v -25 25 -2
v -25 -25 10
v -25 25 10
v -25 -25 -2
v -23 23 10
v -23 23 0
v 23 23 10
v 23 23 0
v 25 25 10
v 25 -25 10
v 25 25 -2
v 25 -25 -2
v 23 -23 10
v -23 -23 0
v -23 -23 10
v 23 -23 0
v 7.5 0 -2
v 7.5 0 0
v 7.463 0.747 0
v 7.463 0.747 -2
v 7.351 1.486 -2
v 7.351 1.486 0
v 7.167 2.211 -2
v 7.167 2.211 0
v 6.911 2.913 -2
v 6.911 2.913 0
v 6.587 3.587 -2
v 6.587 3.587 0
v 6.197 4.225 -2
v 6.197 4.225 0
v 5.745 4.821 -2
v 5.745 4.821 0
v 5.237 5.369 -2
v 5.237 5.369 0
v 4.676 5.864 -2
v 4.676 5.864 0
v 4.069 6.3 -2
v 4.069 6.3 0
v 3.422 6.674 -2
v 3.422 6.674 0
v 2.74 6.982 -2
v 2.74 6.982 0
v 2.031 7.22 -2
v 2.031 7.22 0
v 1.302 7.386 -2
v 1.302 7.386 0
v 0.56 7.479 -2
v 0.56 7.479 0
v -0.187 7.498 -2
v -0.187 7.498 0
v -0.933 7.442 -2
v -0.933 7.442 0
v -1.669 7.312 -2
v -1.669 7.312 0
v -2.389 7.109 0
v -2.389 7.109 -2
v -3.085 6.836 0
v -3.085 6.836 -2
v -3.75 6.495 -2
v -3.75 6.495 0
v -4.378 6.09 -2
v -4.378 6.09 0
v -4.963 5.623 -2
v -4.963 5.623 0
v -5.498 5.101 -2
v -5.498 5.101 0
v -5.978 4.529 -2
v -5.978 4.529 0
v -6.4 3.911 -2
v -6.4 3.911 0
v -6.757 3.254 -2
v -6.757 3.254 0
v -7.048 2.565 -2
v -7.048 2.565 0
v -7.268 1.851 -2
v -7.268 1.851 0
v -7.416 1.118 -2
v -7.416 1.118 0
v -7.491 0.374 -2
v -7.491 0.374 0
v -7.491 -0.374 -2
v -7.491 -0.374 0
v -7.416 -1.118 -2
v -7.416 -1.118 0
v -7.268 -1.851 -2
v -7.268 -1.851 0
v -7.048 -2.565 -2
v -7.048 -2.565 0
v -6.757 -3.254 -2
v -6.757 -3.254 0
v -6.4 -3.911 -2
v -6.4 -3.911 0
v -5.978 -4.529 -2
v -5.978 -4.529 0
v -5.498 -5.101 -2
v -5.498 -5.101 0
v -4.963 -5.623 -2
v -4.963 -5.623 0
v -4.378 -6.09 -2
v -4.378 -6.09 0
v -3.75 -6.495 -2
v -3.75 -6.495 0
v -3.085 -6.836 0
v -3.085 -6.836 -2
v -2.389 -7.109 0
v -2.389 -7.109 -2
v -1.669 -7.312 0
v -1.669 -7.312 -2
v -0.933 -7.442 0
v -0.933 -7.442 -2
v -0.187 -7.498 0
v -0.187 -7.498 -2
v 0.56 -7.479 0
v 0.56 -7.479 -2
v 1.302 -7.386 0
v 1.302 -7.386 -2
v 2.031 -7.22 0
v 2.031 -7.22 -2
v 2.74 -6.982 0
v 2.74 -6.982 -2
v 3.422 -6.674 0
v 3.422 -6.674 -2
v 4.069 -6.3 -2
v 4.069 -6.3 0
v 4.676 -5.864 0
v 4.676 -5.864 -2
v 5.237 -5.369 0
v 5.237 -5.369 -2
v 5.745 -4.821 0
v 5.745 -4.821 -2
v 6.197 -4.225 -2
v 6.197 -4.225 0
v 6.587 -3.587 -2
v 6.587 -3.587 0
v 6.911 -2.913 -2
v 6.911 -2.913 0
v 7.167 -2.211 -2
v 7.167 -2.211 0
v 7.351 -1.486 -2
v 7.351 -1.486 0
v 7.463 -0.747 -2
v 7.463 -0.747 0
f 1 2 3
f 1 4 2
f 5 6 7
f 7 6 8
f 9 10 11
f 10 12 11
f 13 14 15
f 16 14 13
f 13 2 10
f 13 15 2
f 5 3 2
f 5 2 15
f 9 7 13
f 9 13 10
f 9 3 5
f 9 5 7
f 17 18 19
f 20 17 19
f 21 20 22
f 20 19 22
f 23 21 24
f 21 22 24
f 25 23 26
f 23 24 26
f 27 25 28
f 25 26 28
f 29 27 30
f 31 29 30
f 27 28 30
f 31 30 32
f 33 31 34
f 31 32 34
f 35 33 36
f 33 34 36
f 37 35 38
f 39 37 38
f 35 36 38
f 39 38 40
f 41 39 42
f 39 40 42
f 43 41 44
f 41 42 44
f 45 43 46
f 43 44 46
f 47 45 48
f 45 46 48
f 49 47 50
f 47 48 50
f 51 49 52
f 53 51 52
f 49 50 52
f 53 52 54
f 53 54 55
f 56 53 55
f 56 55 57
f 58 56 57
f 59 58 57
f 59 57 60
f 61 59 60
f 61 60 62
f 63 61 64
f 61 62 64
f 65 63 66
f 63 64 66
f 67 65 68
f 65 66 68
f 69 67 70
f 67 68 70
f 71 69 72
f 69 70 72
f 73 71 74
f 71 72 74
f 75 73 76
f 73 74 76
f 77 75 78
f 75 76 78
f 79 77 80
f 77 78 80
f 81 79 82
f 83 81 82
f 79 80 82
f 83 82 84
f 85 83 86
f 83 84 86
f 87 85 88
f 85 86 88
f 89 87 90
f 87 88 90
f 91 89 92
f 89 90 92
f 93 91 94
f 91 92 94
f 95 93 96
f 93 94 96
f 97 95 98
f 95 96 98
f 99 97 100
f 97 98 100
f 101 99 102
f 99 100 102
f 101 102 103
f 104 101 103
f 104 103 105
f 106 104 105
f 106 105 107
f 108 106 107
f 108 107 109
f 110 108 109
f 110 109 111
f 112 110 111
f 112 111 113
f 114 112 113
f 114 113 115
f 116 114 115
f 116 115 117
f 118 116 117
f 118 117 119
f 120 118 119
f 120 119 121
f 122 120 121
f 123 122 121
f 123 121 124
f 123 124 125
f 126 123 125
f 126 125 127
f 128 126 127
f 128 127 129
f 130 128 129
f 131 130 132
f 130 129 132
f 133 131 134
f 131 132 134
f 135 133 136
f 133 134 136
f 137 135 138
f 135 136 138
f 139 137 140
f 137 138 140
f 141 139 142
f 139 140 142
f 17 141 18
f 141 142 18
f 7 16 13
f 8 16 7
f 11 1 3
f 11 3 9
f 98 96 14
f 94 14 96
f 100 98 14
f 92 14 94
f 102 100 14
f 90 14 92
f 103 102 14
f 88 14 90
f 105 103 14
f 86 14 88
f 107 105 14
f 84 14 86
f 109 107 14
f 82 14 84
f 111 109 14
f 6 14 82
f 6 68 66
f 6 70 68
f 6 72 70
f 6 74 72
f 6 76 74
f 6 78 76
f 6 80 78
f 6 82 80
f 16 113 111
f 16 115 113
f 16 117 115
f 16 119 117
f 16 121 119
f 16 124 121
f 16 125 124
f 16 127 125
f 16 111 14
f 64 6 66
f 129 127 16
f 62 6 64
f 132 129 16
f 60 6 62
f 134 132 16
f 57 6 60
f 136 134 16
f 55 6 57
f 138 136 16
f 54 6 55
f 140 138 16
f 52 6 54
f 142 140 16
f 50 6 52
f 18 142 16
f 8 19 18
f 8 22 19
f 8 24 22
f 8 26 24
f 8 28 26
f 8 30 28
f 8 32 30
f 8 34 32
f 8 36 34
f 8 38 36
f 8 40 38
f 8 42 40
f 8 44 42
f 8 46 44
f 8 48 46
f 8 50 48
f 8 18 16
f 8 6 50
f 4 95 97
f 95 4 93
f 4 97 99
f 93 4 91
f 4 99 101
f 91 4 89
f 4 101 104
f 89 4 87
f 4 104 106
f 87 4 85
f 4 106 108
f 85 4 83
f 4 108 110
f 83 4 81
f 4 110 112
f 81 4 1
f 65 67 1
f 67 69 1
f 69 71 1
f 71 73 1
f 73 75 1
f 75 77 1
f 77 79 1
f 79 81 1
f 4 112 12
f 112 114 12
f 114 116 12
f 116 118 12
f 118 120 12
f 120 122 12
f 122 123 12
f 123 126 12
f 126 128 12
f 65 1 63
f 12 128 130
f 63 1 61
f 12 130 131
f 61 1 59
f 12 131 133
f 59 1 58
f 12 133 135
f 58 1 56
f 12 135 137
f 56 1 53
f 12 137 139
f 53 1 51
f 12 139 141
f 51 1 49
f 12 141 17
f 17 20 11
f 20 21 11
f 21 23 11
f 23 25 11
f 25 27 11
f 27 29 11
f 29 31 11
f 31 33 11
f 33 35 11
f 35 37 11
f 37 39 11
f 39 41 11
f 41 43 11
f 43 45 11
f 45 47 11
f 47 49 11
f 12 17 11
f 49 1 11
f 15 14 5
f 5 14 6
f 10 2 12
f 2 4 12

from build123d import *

# Parameters (mm, degrees)
F0_W     = 50
F0_H     = 50
F0_R     = 7.5
F2_DEPTH = 2
F1_W     = 50
F1_H     = 50
F1_W_2   = 46
F1_H_2   = 46
F3_DEPTH = 10


with BuildPart() as f2:
    # F0 (on Top) → F2 (new body)
    with BuildSketch(Plane.XY):
        Rectangle(F0_W, F0_H)
        Circle(F0_R, mode=Mode.SUBTRACT)
    extrude(amount=-F2_DEPTH)

    # F1 (on face) → F3 (join)
    with BuildSketch(Plane.XY):
        Rectangle(F1_W, F1_H)
        Rectangle(F1_W_2, F1_H_2, mode=Mode.SUBTRACT)
    extrude(amount=F3_DEPTH)


solid = f2.part
